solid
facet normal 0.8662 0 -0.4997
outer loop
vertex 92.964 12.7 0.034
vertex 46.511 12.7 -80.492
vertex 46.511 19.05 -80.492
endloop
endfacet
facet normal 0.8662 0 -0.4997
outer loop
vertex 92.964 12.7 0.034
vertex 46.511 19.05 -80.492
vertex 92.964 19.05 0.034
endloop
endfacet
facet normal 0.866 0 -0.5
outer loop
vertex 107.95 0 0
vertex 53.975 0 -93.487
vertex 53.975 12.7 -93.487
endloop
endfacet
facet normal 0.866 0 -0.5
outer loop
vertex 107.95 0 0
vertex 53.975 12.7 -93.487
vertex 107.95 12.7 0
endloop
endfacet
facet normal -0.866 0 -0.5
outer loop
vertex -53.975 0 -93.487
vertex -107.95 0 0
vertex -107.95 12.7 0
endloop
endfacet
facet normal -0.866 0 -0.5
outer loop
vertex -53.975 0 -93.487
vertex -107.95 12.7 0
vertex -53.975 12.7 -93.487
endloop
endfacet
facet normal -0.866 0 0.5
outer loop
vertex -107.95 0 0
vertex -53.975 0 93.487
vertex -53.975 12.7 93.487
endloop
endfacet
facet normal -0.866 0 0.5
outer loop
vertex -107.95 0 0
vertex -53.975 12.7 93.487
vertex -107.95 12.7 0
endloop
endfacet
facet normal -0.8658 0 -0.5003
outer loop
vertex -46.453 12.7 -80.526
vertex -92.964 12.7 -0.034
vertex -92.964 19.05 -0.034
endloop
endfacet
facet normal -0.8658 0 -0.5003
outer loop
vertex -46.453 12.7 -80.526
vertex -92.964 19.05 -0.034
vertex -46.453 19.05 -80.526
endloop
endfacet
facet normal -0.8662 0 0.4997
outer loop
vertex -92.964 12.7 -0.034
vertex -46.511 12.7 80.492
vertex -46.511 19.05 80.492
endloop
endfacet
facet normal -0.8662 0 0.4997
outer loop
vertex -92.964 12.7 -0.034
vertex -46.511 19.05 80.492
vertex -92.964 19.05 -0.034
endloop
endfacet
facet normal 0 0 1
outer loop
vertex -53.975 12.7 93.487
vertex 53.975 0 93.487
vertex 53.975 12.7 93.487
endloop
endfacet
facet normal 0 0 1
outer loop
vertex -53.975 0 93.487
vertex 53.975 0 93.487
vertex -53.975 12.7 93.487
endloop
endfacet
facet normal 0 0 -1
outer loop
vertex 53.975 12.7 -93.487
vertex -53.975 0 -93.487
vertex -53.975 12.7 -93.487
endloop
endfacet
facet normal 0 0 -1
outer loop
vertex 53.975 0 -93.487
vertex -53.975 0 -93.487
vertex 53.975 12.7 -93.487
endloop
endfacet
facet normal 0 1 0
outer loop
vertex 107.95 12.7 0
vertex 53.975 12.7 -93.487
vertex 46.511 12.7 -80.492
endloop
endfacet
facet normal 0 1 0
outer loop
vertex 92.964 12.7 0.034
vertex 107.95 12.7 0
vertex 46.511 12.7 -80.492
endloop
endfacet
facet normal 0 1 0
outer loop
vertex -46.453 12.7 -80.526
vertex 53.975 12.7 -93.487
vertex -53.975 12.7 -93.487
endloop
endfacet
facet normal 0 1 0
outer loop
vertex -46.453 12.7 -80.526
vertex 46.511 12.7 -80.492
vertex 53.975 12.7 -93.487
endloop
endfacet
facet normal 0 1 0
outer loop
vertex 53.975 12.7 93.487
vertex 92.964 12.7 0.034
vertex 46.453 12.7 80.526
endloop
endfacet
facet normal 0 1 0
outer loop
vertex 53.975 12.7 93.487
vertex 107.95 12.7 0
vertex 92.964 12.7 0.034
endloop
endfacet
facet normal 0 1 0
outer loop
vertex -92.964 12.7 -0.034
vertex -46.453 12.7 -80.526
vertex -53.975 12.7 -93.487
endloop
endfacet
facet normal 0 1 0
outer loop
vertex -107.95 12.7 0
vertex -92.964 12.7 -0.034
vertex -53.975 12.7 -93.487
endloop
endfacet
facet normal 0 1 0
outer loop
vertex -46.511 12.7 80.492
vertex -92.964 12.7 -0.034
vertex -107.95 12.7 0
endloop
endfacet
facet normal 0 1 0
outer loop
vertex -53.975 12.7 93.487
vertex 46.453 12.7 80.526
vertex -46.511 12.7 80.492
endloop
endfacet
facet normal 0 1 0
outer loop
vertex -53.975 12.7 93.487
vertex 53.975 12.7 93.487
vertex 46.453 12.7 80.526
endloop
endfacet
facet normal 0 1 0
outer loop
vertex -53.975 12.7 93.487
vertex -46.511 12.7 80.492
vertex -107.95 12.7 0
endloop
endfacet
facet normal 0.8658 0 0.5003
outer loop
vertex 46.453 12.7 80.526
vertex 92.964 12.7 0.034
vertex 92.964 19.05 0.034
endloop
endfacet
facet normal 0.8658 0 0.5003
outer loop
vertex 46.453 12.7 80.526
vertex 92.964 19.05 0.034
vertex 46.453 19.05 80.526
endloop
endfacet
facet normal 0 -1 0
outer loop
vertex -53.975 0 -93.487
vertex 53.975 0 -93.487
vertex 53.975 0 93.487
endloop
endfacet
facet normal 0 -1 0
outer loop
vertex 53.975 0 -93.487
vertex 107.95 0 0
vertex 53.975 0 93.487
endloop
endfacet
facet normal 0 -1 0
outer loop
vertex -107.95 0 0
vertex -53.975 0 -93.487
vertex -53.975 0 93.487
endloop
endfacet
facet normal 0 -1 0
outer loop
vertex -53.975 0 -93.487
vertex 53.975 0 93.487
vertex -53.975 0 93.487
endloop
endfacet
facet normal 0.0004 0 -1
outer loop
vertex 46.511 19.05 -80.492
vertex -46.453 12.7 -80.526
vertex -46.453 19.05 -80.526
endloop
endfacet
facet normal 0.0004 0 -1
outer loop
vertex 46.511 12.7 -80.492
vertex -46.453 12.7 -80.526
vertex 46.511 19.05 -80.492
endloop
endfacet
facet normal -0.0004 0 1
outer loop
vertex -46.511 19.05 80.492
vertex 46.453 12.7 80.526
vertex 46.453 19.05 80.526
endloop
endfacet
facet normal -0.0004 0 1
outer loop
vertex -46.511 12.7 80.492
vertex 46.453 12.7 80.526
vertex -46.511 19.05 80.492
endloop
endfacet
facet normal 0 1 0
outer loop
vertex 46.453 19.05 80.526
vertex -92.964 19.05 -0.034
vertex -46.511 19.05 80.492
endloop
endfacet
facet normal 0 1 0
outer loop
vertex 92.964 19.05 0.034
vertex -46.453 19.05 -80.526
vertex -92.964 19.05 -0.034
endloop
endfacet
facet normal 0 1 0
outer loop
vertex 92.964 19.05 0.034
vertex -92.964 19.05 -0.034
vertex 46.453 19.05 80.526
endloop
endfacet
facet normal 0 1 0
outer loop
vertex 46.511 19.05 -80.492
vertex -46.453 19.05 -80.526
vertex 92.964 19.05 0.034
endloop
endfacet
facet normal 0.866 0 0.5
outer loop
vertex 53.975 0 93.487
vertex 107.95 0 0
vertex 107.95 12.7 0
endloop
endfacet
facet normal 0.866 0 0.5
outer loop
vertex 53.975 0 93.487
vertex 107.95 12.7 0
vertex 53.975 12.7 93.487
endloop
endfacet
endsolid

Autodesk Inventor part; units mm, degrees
ref_plane "YZ Plane" through (0, 0, 0) normal (1, 0, 0) x (0, 1, 0)
ref_plane "XZ Plane" through (0, 0, 0) normal (0, 1, 0) x (-1, 0, 0)
ref_plane "XY Plane" through (0, 0, 0) normal (0, 0, 1) x (1, 0, 0)
sketch "Sketch1" plane through (0, 0, 0) normal (0, 1, 0) x (-1, 0, 0)
  line L0 (-107.95, 0) -> (-53.975, 93.4874)
  line L1 (-53.975, 93.4874) -> (53.975, 93.4874)
  line L2 (53.975, 93.4874) -> (107.95, 0)
  line L3 (107.95, 0) -> (53.975, -93.4874)
  line L4 (53.975, -93.4874) -> (-53.975, -93.4874)
  line L5 (-53.975, -93.4874) -> (-107.95, 0)
  line L6 (-95.25, 0.0344) -> (-47.5952, 82.5062)
  line L7 (-47.5952, 82.5062) -> (47.6548, 82.4717)
  line L8 (47.6548, 82.4717) -> (95.25, -0.0344)
  line L9 (95.25, -0.0344) -> (47.5952, -82.5062)
  line L10 (47.5952, -82.5062) -> (-47.6548, -82.4717)
  line L11 (-47.6548, -82.4717) -> (-95.25, 0.0344)
  point P0 (0, 0)
  point P1 (0, 0)
  point P2 (0, 0)
  point P3 (0, 0)
  dimension "d0" = 215.9
  dimension "d1" = 12.7
extrude "Extrusion1" add sketch "Sketch1" along normal blind 12.7 contours L0 L1 L2 L3 L4 L5 | L6 L7 L8 L9 L10 L11
sketch "Sketch2" plane through (0, 12.7, 0) normal (0, 1, 0) x (1, 0, 0)
  line L0 (-107.95, -0.0035) -> (-53.978, 93.4857)
  line L1 (-53.978, 93.4857) -> (53.972, 93.4892)
  line L2 (53.972, 93.4892) -> (107.95, 0.0035)
  line L3 (107.95, 0.0035) -> (53.978, -93.4857)
  line L4 (53.978, -93.4857) -> (-53.972, -93.4892)
  line L5 (-53.972, -93.4892) -> (-107.95, -0.0035)
  line L6 (-92.964, 0.0336) -> (-46.4529, 80.526)
  line L7 (-46.4529, 80.526) -> (46.5111, 80.4924)
  line L8 (46.5111, 80.4924) -> (92.964, -0.0336)
  line L9 (92.964, -0.0336) -> (46.4529, -80.526)
  line L10 (46.4529, -80.526) -> (-46.5111, -80.4924)
  line L11 (-46.5111, -80.4924) -> (-92.964, 0.0336)
  point P0 (0, 0)
  point P1 (0, 0)
  point P2 (0, 0)
  point P3 (0, 0)
  dimension "d4" = 215.9
  dimension "d5" = 14.986
extrude "Extrusion2" add sketch "Sketch2" along normal blind 6.35 contours L6 L7 L8 L9 L10 L11
properties part number "SatelliteBottomFace_v2"
